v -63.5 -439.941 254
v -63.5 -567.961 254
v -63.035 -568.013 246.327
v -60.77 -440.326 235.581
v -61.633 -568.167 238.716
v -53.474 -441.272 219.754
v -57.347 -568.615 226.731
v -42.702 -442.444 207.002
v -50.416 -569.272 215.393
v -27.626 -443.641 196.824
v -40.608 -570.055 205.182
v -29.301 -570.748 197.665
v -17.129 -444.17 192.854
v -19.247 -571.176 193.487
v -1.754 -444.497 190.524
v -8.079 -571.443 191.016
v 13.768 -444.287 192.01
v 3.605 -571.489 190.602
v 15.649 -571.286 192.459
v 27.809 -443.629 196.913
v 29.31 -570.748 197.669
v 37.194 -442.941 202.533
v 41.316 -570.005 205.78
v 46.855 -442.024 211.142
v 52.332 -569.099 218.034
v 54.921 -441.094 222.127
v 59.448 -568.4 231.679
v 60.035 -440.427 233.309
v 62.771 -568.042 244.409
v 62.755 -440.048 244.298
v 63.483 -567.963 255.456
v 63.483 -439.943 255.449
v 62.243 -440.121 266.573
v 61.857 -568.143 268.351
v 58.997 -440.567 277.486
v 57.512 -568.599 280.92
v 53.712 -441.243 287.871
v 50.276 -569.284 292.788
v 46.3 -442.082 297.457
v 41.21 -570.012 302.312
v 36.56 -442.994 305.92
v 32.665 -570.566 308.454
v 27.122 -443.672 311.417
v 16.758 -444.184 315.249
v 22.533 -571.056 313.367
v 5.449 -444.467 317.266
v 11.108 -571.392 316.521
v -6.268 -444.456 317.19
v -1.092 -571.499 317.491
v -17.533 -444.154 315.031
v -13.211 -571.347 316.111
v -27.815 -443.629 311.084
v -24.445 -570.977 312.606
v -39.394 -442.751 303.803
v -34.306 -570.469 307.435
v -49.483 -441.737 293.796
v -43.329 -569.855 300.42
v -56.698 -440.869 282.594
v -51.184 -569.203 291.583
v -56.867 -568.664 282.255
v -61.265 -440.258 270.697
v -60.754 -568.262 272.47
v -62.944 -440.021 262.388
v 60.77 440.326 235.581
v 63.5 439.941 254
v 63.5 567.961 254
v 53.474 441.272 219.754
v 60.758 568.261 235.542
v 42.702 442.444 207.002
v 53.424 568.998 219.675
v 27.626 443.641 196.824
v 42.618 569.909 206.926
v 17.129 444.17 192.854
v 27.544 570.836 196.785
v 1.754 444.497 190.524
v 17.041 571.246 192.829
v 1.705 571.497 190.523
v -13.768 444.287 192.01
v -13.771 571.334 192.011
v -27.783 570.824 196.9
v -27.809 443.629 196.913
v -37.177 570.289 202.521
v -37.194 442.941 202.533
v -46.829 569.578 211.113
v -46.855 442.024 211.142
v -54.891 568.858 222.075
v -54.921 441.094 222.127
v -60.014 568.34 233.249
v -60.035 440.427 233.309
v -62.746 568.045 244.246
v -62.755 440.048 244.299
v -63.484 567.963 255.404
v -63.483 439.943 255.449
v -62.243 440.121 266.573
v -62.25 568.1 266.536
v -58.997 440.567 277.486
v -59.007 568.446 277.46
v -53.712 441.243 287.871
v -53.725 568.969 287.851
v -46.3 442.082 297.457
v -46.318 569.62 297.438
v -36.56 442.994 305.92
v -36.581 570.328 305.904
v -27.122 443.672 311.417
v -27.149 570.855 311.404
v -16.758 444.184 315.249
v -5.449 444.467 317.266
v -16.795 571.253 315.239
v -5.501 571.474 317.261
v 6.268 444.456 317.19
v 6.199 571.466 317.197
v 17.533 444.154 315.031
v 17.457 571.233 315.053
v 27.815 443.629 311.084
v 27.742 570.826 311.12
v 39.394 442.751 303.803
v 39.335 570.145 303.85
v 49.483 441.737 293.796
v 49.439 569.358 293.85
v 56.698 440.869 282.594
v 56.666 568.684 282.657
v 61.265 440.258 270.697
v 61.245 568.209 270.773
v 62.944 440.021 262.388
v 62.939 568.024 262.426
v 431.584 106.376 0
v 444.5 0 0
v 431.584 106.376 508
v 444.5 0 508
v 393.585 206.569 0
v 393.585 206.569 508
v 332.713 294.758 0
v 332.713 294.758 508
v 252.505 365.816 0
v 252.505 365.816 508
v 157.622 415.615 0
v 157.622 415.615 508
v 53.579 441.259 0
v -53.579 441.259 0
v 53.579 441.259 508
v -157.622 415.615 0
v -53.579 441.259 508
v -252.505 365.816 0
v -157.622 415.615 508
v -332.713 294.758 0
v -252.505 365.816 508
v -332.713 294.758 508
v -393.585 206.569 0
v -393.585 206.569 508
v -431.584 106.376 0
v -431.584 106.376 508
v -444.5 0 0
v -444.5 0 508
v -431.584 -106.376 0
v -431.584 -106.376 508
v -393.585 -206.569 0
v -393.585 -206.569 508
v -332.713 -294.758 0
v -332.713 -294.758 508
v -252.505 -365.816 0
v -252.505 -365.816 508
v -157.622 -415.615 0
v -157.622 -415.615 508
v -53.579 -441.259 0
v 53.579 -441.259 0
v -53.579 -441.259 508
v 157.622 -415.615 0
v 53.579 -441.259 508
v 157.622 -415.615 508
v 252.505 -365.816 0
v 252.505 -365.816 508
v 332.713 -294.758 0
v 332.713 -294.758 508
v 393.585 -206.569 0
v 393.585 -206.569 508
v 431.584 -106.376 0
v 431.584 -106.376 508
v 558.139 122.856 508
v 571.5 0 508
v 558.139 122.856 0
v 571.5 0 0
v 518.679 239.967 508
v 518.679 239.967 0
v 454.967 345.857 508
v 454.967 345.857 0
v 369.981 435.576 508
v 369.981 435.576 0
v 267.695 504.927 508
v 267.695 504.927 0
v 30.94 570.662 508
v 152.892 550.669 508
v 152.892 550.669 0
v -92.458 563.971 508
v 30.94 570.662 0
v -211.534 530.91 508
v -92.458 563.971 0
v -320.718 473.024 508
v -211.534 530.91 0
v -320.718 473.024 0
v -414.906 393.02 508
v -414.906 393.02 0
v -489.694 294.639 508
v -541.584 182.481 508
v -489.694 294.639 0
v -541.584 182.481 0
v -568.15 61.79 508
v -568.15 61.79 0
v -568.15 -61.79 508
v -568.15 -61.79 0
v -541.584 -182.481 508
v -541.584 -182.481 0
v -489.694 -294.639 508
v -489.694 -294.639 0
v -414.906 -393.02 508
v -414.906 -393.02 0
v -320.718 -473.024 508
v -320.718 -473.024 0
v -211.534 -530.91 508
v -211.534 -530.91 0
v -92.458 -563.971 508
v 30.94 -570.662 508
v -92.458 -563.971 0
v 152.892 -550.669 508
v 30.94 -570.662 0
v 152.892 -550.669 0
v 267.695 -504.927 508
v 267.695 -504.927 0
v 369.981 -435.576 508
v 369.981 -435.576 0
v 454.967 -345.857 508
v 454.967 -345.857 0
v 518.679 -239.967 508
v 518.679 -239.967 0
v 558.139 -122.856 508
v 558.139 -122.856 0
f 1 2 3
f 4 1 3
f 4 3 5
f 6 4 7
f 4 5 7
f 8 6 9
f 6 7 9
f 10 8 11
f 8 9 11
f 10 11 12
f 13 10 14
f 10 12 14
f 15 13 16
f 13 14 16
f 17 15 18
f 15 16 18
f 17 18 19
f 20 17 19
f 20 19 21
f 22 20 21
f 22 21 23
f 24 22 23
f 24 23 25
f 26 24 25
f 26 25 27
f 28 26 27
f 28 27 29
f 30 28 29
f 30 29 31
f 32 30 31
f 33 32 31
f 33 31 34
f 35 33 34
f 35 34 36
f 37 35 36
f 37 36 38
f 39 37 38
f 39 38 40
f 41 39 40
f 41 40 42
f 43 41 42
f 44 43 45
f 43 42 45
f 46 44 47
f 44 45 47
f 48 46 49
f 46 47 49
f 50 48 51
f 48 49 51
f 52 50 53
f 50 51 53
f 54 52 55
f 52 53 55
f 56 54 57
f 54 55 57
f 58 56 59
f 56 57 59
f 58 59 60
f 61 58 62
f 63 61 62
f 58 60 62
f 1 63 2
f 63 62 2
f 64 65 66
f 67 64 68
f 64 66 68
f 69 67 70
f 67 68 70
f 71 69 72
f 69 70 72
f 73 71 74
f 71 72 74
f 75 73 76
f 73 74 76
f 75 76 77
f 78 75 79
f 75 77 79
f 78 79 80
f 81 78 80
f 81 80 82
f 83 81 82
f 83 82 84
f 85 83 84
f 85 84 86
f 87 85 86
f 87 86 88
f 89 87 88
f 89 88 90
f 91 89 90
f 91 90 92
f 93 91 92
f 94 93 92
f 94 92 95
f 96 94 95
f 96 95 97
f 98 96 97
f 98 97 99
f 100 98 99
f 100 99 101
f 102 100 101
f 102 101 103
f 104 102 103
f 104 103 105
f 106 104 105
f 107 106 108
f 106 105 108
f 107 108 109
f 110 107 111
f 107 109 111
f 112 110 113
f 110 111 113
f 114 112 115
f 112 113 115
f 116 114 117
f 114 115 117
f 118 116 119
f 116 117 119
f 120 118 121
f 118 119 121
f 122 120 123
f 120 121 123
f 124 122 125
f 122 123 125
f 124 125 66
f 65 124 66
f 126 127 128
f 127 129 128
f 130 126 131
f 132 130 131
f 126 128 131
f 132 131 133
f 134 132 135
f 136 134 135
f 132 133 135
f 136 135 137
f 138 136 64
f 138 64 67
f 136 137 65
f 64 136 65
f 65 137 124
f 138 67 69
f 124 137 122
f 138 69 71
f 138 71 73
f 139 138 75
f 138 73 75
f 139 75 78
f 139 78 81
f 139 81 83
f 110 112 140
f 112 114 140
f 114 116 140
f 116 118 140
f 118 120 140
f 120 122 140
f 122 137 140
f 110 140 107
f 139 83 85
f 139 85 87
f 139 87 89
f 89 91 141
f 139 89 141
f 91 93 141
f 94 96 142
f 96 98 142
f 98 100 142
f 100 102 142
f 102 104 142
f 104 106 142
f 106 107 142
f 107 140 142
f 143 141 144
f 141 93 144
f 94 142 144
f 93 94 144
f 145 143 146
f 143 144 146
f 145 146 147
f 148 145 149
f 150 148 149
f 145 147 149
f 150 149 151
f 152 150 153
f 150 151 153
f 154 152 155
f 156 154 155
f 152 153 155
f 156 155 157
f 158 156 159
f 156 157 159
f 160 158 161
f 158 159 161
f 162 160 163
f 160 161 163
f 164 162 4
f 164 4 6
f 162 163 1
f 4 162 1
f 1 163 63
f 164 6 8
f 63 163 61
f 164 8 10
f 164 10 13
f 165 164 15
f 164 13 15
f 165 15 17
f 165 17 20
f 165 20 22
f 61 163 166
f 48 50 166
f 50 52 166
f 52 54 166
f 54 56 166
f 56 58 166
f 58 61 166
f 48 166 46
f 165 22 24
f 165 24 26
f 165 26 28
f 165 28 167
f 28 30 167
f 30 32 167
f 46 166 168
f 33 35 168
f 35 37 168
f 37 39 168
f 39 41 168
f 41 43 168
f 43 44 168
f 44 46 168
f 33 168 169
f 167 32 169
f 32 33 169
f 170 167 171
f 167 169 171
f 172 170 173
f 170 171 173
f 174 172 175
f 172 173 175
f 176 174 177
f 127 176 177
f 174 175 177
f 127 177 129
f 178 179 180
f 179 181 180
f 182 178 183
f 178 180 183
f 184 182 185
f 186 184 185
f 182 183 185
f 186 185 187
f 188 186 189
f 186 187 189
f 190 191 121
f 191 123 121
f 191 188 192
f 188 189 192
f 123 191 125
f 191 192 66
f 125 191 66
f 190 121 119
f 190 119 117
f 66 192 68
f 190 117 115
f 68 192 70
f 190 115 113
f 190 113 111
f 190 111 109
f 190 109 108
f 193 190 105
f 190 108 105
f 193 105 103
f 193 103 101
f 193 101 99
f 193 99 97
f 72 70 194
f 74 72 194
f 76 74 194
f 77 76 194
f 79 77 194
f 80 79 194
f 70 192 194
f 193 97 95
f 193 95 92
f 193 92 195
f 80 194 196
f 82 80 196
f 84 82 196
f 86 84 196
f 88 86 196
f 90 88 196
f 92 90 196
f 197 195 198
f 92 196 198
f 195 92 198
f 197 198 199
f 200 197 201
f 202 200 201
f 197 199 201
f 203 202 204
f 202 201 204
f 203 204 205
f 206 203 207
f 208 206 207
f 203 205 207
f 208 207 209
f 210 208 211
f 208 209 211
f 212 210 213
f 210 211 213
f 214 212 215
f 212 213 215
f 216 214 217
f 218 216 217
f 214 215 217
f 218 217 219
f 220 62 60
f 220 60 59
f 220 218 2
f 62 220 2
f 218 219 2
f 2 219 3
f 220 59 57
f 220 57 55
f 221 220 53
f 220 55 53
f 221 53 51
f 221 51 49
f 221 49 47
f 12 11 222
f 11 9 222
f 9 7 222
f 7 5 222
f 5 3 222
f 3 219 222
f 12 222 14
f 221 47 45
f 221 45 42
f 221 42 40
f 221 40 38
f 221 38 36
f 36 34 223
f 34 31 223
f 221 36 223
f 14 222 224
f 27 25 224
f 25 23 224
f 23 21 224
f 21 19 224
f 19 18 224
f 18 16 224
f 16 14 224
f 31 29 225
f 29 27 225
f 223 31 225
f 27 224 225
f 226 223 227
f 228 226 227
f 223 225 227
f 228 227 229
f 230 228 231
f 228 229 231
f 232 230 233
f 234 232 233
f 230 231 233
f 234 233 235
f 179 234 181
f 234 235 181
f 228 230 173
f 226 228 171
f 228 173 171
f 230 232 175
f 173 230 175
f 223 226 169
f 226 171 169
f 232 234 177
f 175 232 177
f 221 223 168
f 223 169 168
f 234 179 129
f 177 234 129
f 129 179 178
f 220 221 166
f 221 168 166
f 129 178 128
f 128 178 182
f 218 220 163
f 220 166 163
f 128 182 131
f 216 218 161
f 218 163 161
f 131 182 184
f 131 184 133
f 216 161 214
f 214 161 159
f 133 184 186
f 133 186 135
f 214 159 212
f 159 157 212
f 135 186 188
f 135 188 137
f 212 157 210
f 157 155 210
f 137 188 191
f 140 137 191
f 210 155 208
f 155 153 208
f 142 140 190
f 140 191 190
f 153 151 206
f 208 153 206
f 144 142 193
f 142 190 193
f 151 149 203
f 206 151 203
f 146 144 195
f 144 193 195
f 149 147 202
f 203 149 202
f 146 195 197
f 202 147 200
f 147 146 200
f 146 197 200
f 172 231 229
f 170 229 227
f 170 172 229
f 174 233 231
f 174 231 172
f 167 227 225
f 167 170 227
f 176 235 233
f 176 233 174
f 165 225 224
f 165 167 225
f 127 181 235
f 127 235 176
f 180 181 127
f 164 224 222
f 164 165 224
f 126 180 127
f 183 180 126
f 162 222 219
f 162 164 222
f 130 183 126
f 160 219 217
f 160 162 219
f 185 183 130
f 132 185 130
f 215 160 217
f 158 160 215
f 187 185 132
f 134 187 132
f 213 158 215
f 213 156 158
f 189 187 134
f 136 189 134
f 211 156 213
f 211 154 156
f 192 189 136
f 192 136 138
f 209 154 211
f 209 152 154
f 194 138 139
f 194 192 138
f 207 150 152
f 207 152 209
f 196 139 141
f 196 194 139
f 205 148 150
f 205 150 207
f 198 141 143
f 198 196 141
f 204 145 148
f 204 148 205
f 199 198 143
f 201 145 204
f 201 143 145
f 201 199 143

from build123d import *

# Parameters (mm, degrees)
SKETCH1_W   = 571.5
SKETCH1_H   = 508
HOLE1_D     = 889
HOLE2_D     = 127
HOLE2_DEPTH = 131.559094878
HOLE3_D     = 127


with BuildPart() as part:
    # Sketch1 → Revolve1 (revolve)
    with BuildSketch(Plane(origin=(0, 0, 0), x_dir=(1, 0, 0), z_dir=(0, 1, 0))):
        with Locations((285.75, -254)):
            Rectangle(SKETCH1_W, SKETCH1_H)
    revolve(axis=Axis((0, 0, 0), (0, 0, 1)))

    # Hole1 (through all)
    with Locations(Plane(origin=(0, 0, 0), x_dir=(-1, 0, 0), z_dir=(0, 0, -1))):
        with Locations((0, 0)):
            Hole(HOLE1_D / 2)

    # Hole2
    with Locations(Plane(origin=(0, -439.940905122, 0), x_dir=(1, 0, 0), z_dir=(0, 1, 0))):
        with Locations((0, -254)):
            Hole(HOLE2_D / 2, depth=HOLE2_DEPTH)

    # Hole3 (through all)
    with Locations(Plane(origin=(0, 439.940905122, 0), x_dir=(-1, 0, 0), z_dir=(0, -1, 0))):
        with Locations((0, -254)):
            Hole(HOLE3_D / 2)


solid = part.part
